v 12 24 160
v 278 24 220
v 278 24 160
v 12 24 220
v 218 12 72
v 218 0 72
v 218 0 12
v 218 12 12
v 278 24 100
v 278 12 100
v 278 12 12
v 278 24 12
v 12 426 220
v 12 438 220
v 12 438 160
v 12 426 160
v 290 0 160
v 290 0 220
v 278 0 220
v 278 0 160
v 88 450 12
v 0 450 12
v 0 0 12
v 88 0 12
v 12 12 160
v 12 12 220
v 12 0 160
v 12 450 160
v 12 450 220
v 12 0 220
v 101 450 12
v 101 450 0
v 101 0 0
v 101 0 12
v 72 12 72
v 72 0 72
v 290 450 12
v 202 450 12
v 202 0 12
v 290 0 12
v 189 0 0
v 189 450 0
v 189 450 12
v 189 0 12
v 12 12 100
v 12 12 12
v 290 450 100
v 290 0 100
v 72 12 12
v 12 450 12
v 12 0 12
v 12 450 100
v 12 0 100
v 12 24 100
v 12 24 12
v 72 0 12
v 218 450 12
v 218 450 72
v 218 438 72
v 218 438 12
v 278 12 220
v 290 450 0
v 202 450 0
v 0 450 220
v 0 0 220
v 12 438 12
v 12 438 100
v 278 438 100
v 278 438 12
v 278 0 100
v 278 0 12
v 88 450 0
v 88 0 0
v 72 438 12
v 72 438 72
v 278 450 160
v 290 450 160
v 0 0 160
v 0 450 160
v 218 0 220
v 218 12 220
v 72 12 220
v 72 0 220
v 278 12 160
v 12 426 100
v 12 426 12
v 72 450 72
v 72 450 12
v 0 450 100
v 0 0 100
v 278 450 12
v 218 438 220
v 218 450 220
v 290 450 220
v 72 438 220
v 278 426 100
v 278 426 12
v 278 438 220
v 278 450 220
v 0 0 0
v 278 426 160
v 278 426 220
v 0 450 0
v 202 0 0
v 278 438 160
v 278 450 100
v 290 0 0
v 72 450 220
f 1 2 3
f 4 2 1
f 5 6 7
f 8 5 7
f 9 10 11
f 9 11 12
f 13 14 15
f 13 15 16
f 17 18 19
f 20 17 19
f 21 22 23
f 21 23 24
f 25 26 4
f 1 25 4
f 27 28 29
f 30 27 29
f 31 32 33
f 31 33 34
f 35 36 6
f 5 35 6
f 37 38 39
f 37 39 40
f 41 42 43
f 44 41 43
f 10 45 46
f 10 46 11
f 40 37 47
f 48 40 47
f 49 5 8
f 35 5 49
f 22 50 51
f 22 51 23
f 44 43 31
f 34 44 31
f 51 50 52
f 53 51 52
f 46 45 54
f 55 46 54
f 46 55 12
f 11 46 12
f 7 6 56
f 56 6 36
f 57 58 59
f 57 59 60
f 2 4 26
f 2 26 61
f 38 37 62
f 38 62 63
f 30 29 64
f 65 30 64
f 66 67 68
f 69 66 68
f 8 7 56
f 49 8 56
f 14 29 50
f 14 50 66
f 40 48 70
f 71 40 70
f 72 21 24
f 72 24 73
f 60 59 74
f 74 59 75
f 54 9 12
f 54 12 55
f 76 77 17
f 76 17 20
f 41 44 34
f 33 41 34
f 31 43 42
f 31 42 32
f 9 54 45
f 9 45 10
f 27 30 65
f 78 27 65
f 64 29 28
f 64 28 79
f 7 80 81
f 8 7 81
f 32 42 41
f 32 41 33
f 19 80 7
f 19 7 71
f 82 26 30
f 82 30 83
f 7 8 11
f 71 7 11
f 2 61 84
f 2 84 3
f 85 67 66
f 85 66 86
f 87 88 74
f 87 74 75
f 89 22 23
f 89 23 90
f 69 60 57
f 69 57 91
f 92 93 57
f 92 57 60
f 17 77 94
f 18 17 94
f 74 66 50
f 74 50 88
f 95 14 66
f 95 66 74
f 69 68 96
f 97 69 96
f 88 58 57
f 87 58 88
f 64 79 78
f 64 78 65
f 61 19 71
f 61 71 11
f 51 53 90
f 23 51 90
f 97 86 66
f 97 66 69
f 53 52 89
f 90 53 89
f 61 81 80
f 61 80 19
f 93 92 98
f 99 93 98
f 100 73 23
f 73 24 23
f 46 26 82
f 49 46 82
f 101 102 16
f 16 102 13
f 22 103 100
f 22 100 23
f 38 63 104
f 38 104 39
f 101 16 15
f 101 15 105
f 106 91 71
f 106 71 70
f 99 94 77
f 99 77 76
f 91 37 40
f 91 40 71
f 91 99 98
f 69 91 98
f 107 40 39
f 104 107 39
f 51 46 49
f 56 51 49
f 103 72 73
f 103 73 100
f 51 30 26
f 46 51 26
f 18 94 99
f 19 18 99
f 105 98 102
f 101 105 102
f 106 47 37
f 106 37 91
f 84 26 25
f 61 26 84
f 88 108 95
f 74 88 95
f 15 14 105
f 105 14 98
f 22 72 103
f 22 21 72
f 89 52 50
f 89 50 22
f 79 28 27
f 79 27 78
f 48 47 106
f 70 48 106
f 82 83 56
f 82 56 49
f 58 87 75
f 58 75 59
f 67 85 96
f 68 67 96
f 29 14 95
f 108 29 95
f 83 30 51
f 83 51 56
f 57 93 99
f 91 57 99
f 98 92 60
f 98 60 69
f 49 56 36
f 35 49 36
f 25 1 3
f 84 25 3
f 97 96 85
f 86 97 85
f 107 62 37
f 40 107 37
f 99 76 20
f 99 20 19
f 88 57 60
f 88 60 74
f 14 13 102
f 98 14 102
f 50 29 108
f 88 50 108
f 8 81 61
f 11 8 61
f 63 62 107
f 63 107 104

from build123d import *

# Parameters (mm, degrees)
F0_W      = 290
F0_H      = 225
F1_DEPTH  = 220
F2_W      = 12
F2_H      = 60
F3_DEPTH  = 450
F2_H_2    = 12
F2_W_2    = 88
F2_H_3    = 88
F4_DEPTH  = 450
F5_W      = 60
F5_H      = 12
F6_DEPTH  = 208
F5_W_2    = 73
F7_DEPTH  = 60
F8_START  = -120
F8_DEPTH  = 88
F9_DEPTH  = 12
F10_DEPTH = 25


with BuildPart() as f1:
    # F0 (on Top) → F1 (new body)
    with BuildSketch(Plane.XY):
        with Locations((145, 112.5)):
            Rectangle(F0_W, F0_H)
        with Locations((145, 337.5)):
            Rectangle(F0_W, F0_H)
    extrude(amount=F1_DEPTH)


with BuildPart() as f3:
    # F2 (on face) → F3 (new body, through all)
    with BuildSketch(Plane(origin=(0, 450, 0), x_dir=(-1, 0, 0), z_dir=(0, 1, 0))):
        with Locations((-284, 190)):
            Rectangle(F2_W, F2_H)
    extrude(amount=-F3_DEPTH)


with BuildPart() as f3b:
    # F2 (on face) → F3, piece 2 (new body, through all)
    with BuildSketch(Plane(origin=(0, 450, 0), x_dir=(-1, 0, 0), z_dir=(0, 1, 0))):
        Polygon((-278, 0), (-202, 0), (-202, 12), (-218, 12), (-278, 12), align=None)
        with Locations((-284, 6)):
            Rectangle(F2_W, F2_H_2)
    extrude(amount=-F3_DEPTH)


with BuildPart() as f3c:
    # F2 (on face) → F3, piece 3 (new body, through all)
    with BuildSketch(Plane(origin=(0, 450, 0), x_dir=(-1, 0, 0), z_dir=(0, 1, 0))):
        with Locations((-145, 6)):
            Rectangle(F2_W_2, F2_H_2)
    extrude(amount=-F3_DEPTH)


with BuildPart() as f3d:
    # F2 (on face) → F3, piece 4 (new body, through all)
    with BuildSketch(Plane(origin=(0, 450, 0), x_dir=(-1, 0, 0), z_dir=(0, 1, 0))):
        Polygon((-88, 0), (-12, 0), (-12, 12), (-72, 12), (-88, 12), align=None)
        with Locations((-6, 6)):
            Rectangle(F2_W, F2_H_2)
    extrude(amount=-F3_DEPTH)


with BuildPart() as f3e:
    # F2 (on face) → F3, piece 5 (new body, through all)
    with BuildSketch(Plane(origin=(0, 450, 0), x_dir=(-1, 0, 0), z_dir=(0, 1, 0))):
        with Locations((-6, 190)):
            Rectangle(F2_W, F2_H)
    extrude(amount=-F3_DEPTH)


with BuildPart() as f4:
    # F2 (on face) → F4 (new body, through all)
    with BuildSketch(Plane(origin=(0, 450, 0), x_dir=(-1, 0, 0), z_dir=(0, 1, 0))):
        with Locations((-284, 56)):
            Rectangle(F2_W, F2_H_3)
    extrude(amount=-F4_DEPTH)


with BuildPart() as f4b:
    # F2 (on face) → F4, piece 2 (new body, through all)
    with BuildSketch(Plane(origin=(0, 450, 0), x_dir=(-1, 0, 0), z_dir=(0, 1, 0))):
        with Locations((-6, 56)):
            Rectangle(F2_W, F2_H_3)
    extrude(amount=-F4_DEPTH)


with BuildPart() as f6:
    # F5 (on face) → F6 (new body, through all)
    with BuildSketch(Plane.XY.offset(220)):
        with Locations((42, 6)):
            Rectangle(F5_W, F5_H)
    extrude(amount=-F6_DEPTH)


with BuildPart() as f6b:
    # F5 (on face) → F6, piece 2 (new body, through all)
    with BuildSketch(Plane.XY.offset(220)):
        with Locations((248, 6)):
            Rectangle(F5_W, F5_H)
    extrude(amount=-F6_DEPTH)


with BuildPart() as f7:
    # F5 (on face) → F7 (new body)
    with BuildSketch(Plane.XY.offset(220)):
        with Locations((42, 18)):
            Rectangle(F5_W, F5_H)
        with Locations((108.5, 18)):
            Rectangle(F5_W_2, F5_H)
        with Locations((181.5, 18)):
            Rectangle(F5_W_2, F5_H)
        with Locations((248, 18)):
            Rectangle(F5_W, F5_H)
    extrude(amount=-F7_DEPTH)


with BuildPart() as f8:
    # F5 (on face) → F8 (new body)
    with BuildSketch(Plane.XY.offset(220).offset(F8_START)):
        with Locations((42, 18)):
            Rectangle(F5_W, F5_H)
        with Locations((108.5, 18)):
            Rectangle(F5_W_2, F5_H)
        with Locations((181.5, 18)):
            Rectangle(F5_W_2, F5_H)
        with Locations((248, 18)):
            Rectangle(F5_W, F5_H)
    extrude(amount=-F8_DEPTH)


with BuildPart() as f9:
    # F2 (on face) → F9 (new body)
    with BuildSketch(Plane(origin=(0, 450, 0), x_dir=(-1, 0, 0), z_dir=(0, 1, 0))):
        Polygon((-101, 12), (-88, 12), (-72, 12), (-72, 72), (-218, 72), (-218, 12), (-202, 12), (-189, 12), align=None)
    extrude(amount=-F9_DEPTH)


with BuildPart() as f10:
    # F0 (on Top) → F10 (new body)
    with BuildSketch(Plane.XY):
        with Locations((145, 112.5)):
            Rectangle(F0_W, F0_H)
    extrude(amount=F10_DEPTH)


with BuildPart() as f11_1:
    # F11: instance of F9
    add(f9.part.mirror(Plane(origin=(145, 225, 12.5), x_dir=(-1, 0, 0), z_dir=(0, 1, 0))))


with BuildPart() as f11_2:
    # F11: instance of F6b
    add(f6b.part.mirror(Plane(origin=(145, 225, 12.5), x_dir=(-1, 0, 0), z_dir=(0, 1, 0))))


with BuildPart() as f11_3:
    # F11: instance of F7
    add(f7.part.mirror(Plane(origin=(145, 225, 12.5), x_dir=(-1, 0, 0), z_dir=(0, 1, 0))))


with BuildPart() as f11_4:
    # F11: instance of F8
    add(f8.part.mirror(Plane(origin=(145, 225, 12.5), x_dir=(-1, 0, 0), z_dir=(0, 1, 0))))


with BuildPart() as f11_5:
    # F11: instance of F6
    add(f6.part.mirror(Plane(origin=(145, 225, 12.5), x_dir=(-1, 0, 0), z_dir=(0, 1, 0))))


solid = Compound([f3.part, f3b.part, f3c.part, f3d.part, f3e.part, f4.part, f4b.part, f6.part, f6b.part, f7.part, f8.part, f9.part, f11_1.part, f11_2.part, f11_3.part, f11_4.part, f11_5.part])
